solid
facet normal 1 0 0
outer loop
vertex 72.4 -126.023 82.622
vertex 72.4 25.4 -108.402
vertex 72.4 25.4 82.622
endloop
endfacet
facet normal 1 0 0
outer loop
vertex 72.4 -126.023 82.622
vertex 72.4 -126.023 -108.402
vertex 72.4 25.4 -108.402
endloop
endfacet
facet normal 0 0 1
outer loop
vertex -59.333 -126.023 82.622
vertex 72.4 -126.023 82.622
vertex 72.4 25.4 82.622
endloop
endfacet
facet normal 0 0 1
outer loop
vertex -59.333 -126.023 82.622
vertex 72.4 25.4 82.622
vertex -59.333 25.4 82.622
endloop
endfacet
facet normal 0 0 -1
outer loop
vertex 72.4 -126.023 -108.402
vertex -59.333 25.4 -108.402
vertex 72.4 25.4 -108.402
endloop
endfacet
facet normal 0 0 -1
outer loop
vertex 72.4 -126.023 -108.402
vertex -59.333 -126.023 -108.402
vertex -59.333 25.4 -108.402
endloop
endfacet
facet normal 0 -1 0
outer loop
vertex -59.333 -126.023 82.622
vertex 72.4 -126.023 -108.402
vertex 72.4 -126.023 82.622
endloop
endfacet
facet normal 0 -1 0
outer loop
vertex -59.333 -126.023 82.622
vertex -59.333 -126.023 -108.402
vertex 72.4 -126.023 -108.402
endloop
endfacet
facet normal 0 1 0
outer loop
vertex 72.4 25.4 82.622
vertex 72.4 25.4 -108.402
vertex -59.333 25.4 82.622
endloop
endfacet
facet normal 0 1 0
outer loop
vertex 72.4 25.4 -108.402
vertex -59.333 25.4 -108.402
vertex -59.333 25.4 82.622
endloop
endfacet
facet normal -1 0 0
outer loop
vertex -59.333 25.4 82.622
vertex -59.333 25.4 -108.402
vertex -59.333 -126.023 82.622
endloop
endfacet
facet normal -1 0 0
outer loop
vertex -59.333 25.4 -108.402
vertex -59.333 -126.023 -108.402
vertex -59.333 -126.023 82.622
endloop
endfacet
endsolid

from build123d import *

# Parameters (mm, degrees)
F0_W     = 106.3328497112
F0_H     = 191.0245120525
F1_DEPTH = 25.4
F5_DEPTH = 100.6231699139
F2_DEPTH = 25.4
F3_DEPTH = 25.4


# Not quite as in the source:
# - the program builds the solid bodies; features that only make, move or delete a surface that nothing else refers to are left out


with BuildPart() as f1:
    # F0 (on Front) → F1 (new body)
    with BuildSketch(Plane.XZ):
        with Locations((-6.1664935201, -12.889765203)):
            Rectangle(F0_W, F0_H)
    extrude(amount=F1_DEPTH)

    # F5 (add): a face of the model
    f5_faces = [f1.faces().sort_by_distance(p)[0] for p in [
        (-6.1664935201, -25.4, -12.889765203),
    ]]
    extrude(f5_faces, amount=F5_DEPTH)

    # F2 (add): a face of the model
    f2_faces = [f1.faces().sort_by_distance(p)[0] for p in [
        (46.9999313354, -63.0115849569, -12.889765203),
    ]]
    extrude(f2_faces, amount=F2_DEPTH)

    # F3 (add): a face of the model
    f3_faces = [f1.faces().sort_by_distance(p)[0] for p in [
        (6.5335064799, 0, -12.889765203),
    ]]
    extrude(f3_faces, amount=F3_DEPTH)


solid = f1.part
